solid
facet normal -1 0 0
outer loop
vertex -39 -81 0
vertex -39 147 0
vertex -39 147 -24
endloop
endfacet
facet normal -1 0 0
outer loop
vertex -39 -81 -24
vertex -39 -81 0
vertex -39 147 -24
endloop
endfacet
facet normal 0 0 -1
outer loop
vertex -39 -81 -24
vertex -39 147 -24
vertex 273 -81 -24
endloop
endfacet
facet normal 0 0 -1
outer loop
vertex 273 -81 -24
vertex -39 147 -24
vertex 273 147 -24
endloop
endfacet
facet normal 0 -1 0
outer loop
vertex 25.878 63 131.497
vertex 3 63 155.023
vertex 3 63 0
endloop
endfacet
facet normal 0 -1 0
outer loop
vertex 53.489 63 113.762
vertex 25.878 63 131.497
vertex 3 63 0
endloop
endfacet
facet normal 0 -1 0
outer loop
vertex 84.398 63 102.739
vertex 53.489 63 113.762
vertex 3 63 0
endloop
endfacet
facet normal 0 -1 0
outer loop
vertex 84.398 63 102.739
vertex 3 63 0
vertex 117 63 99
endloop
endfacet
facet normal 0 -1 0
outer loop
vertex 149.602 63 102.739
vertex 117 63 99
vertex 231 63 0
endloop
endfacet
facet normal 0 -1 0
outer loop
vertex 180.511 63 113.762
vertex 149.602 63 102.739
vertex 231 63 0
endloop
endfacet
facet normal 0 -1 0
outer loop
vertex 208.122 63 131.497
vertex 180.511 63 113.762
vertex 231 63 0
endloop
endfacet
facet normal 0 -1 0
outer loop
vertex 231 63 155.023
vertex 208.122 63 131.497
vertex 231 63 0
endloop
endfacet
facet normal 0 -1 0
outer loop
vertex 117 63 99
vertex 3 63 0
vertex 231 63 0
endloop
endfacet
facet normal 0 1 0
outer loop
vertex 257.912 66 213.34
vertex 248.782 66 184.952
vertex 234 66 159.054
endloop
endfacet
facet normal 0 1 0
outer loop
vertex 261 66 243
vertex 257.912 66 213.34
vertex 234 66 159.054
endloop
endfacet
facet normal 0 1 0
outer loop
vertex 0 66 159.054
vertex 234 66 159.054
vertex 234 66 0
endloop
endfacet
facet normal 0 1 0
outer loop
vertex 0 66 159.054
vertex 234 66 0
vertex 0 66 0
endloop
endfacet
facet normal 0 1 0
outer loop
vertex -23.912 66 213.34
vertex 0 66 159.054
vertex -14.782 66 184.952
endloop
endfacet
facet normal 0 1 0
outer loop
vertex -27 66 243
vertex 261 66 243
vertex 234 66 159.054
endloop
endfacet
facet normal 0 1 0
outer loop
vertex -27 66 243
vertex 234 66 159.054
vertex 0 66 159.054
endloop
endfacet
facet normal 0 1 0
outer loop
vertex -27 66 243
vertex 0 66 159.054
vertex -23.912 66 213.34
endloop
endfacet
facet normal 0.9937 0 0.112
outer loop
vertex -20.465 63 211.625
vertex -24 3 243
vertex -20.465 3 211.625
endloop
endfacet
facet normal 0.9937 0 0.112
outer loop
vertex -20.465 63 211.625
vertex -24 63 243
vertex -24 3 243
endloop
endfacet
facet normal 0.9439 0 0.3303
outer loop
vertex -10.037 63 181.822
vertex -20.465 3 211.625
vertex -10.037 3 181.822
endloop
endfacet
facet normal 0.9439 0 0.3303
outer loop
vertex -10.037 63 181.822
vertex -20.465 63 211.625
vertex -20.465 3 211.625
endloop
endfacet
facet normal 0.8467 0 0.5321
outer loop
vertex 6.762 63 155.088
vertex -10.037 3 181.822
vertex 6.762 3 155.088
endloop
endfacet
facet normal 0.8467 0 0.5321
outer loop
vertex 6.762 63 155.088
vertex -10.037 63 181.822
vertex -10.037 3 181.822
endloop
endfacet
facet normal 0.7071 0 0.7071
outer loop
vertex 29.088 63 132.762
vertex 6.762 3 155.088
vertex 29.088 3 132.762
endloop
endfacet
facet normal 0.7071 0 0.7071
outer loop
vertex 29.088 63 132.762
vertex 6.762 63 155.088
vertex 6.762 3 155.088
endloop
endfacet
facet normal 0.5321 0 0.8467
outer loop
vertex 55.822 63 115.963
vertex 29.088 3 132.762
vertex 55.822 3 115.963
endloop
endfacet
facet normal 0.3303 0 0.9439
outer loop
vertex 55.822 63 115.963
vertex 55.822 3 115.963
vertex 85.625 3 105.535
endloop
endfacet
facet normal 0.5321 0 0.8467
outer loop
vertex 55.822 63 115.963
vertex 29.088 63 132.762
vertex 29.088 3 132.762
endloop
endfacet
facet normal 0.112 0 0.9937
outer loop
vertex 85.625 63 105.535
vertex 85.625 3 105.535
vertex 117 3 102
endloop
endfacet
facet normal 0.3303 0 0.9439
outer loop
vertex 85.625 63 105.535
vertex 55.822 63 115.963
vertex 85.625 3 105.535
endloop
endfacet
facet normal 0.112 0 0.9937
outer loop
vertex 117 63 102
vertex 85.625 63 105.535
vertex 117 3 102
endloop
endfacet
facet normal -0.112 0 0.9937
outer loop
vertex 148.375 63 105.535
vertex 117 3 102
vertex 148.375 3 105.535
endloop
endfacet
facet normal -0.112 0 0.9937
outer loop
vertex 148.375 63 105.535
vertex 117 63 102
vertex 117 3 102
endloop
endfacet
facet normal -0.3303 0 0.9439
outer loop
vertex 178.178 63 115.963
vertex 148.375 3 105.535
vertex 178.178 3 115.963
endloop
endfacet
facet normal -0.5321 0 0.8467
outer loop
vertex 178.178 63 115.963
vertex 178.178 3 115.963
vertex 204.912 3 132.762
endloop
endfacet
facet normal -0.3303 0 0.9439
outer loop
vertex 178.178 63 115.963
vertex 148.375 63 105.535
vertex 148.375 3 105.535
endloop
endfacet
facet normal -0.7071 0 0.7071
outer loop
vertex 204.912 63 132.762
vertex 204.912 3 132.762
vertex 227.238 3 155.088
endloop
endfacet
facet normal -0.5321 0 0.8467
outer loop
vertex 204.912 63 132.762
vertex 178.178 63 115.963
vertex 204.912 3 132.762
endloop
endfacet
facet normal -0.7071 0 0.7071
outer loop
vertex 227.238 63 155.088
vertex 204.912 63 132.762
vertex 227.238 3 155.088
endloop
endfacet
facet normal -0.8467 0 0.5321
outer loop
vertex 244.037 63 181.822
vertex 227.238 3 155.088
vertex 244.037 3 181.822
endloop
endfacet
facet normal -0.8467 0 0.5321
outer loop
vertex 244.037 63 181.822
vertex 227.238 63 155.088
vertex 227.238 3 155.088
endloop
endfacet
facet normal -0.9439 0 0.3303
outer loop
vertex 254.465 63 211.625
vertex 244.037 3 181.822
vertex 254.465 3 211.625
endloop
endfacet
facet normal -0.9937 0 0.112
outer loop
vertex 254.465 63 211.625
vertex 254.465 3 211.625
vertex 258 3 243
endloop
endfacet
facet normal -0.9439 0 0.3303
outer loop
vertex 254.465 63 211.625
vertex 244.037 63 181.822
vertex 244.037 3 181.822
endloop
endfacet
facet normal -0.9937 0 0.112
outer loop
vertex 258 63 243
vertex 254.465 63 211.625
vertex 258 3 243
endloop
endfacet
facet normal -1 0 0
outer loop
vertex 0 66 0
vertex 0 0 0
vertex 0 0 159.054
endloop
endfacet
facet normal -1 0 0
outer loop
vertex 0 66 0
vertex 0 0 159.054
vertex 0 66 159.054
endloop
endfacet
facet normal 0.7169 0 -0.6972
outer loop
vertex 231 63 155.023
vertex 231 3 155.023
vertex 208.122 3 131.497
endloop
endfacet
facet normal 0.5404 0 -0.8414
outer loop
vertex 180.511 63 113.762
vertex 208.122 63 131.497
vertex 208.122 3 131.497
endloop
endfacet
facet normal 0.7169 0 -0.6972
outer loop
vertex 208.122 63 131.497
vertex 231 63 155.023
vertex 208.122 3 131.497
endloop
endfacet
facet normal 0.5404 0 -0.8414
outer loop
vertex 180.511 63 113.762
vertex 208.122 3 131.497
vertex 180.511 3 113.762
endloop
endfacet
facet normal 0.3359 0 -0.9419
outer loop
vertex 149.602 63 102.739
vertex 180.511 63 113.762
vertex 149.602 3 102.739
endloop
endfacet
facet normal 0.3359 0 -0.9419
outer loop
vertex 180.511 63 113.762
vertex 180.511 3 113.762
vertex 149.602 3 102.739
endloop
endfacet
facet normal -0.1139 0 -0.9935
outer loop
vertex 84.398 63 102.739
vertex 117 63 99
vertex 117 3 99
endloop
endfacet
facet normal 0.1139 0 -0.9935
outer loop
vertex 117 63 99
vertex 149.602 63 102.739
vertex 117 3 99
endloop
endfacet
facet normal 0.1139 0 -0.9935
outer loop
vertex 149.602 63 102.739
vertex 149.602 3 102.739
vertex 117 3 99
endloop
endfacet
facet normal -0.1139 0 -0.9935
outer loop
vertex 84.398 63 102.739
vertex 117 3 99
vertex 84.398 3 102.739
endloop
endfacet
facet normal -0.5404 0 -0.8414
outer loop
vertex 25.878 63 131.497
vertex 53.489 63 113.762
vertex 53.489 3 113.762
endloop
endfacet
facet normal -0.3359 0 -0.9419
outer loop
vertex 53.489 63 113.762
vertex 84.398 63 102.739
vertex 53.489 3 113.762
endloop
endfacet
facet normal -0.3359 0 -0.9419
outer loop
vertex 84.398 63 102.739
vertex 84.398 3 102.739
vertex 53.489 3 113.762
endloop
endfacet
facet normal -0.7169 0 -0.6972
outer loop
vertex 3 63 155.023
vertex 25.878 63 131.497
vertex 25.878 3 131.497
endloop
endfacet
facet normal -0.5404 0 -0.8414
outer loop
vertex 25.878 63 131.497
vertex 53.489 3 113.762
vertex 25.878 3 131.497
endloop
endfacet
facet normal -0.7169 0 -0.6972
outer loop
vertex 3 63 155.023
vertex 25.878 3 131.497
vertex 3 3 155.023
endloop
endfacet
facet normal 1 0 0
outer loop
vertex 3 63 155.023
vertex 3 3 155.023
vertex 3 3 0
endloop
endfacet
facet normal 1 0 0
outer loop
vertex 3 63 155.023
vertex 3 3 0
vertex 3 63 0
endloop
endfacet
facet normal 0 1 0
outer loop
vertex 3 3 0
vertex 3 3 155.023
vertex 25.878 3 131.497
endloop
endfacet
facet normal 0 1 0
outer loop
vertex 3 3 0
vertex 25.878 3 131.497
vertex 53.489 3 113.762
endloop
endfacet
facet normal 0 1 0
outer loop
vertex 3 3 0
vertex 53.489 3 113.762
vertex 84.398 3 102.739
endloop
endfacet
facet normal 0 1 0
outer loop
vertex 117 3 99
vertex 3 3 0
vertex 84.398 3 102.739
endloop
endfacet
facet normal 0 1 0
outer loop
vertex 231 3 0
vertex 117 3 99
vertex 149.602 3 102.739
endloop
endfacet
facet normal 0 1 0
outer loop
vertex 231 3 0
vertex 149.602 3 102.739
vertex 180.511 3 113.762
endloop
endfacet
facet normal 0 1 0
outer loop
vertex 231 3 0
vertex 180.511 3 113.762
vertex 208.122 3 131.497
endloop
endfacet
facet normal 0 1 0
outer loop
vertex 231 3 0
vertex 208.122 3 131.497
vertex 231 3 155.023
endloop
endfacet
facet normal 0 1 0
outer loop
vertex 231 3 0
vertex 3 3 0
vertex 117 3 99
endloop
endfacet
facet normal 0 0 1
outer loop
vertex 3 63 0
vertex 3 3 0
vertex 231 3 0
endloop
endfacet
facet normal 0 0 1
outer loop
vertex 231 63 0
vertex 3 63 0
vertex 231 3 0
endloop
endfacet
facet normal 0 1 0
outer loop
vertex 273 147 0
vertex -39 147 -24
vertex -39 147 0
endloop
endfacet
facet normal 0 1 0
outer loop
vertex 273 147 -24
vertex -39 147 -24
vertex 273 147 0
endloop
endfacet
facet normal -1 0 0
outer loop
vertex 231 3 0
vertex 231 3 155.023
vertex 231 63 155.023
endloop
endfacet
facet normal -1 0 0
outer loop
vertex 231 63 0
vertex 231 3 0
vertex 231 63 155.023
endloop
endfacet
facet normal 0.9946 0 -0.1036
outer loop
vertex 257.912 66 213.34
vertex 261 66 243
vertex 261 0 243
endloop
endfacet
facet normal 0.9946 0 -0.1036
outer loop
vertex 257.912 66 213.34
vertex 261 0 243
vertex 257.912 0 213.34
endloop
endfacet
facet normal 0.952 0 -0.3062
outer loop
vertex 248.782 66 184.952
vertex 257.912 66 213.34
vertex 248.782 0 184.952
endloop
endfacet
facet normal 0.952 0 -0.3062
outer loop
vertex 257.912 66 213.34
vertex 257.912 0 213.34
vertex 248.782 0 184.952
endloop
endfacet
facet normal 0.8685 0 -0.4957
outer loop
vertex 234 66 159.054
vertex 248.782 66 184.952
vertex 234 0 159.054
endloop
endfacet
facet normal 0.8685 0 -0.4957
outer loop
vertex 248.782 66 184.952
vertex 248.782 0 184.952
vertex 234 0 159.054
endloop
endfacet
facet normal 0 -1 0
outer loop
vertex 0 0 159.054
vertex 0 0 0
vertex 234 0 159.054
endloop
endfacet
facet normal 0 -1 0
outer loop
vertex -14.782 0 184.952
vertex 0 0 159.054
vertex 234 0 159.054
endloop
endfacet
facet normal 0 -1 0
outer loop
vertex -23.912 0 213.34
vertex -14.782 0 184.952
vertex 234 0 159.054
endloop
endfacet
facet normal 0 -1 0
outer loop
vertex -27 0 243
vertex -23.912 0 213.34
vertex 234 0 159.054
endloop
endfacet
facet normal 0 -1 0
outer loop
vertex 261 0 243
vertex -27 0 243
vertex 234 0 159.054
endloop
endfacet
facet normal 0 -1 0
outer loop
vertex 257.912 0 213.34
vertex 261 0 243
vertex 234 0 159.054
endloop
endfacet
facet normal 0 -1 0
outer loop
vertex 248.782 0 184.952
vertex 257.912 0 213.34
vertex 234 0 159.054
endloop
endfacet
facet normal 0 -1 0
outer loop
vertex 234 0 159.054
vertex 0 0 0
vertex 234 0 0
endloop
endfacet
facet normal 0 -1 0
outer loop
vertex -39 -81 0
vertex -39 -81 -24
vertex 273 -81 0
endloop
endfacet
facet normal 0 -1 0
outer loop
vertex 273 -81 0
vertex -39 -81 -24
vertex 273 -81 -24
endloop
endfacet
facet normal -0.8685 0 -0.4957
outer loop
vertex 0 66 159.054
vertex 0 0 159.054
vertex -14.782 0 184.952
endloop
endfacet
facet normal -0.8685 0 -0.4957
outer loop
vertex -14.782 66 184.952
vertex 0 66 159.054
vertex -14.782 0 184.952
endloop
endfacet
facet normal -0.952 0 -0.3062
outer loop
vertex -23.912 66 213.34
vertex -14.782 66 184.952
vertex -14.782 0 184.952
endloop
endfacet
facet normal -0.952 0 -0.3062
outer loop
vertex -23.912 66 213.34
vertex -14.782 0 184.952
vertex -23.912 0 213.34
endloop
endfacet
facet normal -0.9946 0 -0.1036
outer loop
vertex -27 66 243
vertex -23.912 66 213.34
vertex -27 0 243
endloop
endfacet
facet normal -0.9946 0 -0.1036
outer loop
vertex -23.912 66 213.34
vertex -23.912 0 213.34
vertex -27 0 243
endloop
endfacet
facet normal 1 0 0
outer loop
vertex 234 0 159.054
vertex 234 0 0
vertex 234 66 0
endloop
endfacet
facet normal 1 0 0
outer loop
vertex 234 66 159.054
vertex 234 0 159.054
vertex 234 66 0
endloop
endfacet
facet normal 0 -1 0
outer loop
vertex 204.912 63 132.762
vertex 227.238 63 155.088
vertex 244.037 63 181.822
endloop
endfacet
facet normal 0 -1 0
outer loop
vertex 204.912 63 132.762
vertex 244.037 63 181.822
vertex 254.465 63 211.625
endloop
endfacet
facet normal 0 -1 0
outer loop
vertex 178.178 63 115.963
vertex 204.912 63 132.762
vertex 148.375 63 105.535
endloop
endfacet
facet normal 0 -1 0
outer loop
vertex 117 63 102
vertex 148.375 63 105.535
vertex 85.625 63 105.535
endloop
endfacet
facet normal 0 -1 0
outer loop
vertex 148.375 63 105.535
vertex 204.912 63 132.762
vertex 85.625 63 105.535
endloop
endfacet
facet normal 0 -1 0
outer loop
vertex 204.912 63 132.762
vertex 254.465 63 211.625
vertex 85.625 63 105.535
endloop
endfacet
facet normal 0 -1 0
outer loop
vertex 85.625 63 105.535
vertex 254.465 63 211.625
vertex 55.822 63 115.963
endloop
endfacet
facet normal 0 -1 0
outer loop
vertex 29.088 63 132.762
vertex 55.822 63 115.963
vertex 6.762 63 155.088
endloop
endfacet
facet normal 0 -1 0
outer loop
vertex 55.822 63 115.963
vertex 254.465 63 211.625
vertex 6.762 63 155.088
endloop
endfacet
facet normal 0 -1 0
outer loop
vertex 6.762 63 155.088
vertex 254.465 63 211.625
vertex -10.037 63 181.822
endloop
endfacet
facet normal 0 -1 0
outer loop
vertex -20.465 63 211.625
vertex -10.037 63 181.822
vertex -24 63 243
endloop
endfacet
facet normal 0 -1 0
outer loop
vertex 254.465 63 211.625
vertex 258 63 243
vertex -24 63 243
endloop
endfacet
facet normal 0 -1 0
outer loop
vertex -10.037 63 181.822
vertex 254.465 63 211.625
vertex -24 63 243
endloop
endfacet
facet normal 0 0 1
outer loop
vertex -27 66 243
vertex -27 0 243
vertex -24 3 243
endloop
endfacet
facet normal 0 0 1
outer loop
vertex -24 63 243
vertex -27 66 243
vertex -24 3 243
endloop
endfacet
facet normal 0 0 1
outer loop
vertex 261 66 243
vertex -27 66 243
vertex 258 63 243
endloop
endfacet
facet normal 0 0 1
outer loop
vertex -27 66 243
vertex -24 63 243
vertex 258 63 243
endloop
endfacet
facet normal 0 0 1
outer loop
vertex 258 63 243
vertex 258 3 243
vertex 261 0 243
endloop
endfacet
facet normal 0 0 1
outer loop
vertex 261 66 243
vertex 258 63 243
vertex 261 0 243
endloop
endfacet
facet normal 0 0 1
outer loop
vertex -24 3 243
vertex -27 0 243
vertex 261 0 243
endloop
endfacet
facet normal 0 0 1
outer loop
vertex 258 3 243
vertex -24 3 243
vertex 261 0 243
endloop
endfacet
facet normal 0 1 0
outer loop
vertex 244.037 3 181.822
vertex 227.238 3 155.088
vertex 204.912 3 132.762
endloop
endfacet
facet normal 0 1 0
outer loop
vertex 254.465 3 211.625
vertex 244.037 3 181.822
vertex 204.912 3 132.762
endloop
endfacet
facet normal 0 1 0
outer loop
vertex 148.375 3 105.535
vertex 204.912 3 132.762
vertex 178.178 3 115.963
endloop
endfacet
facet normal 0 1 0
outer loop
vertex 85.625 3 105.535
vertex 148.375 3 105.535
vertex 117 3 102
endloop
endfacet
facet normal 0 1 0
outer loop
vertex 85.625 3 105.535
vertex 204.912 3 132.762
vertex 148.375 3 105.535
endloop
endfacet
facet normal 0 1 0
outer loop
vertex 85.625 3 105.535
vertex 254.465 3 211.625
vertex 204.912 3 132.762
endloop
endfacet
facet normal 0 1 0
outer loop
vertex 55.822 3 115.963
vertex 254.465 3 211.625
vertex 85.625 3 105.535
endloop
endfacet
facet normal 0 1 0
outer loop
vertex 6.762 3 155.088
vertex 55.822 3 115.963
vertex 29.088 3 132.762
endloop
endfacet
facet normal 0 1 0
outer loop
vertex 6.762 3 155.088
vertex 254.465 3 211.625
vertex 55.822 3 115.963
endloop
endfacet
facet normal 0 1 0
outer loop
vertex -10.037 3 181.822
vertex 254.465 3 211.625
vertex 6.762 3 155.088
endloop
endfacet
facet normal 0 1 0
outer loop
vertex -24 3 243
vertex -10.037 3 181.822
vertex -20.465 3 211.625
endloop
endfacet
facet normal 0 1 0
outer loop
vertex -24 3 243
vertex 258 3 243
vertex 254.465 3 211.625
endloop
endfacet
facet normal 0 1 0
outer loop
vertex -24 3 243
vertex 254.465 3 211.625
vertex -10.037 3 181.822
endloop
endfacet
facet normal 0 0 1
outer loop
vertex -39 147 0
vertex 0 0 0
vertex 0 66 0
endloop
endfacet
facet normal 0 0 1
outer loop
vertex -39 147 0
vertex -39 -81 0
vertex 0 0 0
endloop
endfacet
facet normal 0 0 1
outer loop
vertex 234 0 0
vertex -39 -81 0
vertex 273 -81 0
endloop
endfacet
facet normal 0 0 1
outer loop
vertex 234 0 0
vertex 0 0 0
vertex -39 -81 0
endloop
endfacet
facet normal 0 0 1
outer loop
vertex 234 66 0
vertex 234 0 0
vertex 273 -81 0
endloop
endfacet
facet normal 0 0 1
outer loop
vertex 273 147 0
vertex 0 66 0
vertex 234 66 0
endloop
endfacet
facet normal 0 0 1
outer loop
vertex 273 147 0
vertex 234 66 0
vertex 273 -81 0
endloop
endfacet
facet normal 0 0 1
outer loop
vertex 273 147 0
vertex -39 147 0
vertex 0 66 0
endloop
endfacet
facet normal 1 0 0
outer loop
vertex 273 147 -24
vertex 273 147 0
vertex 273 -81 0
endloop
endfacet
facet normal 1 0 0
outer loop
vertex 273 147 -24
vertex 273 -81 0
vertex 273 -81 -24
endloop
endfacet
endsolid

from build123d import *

# Parameters (mm, degrees)
SKETCH1_W                = 234
SKETCH1_H                = 66
SKETCH1_W_2              = 228
SKETCH1_H_2              = 60
BOSS_EXTRUDE1_DEPTH      = 243
BOSS_EXTRUDE2_DEPTH      = 66
SKETCH3_W                = 141
SKETCH3_H                = 60
SKETCH4_W                = 312
SKETCH4_H                = 24
BOSS_EXTRUDE3_DEPTH      = 147
BOSS_EXTRUDE3_DEPTH_BACK = 81


with BuildPart() as part:
    # Sketch1 → Boss-Extrude1 (new body)
    with BuildSketch(Plane.XY):
        with Locations((117, 33)):
            Rectangle(SKETCH1_W, SKETCH1_H)
        with Locations((117, 33)):
            Rectangle(SKETCH1_W_2, SKETCH1_H_2, mode=Mode.SUBTRACT)
    extrude(amount=BOSS_EXTRUDE1_DEPTH)

    # Sketch2 → Boss-Extrude2 (add)
    with BuildSketch(Plane.XZ):
        with BuildLine():
            Line((-27, 243), (261, 243))
            ThreePointArc((261, 243), (117, 99), (-27, 243))
        make_face()
    extrude(amount=-BOSS_EXTRUDE2_DEPTH)

    # Sketch3 → Cut-Revolve1 (revolve, cut)
    with BuildSketch(Plane.XY.offset(243)):
        with Locations((187.5, 33)):
            Rectangle(SKETCH3_W, SKETCH3_H)
    revolve(axis=Axis((117, 63, 243), (0, -1, 0)), mode=Mode.SUBTRACT)

    # Sketch4 → Boss-Extrude3 (add, two sides)
    with BuildSketch(Plane(origin=(0, 0, 0), x_dir=(1, 0, 0), z_dir=(0, 1, 0))) as boss_extrude3_sk:
        with Locations((117, 12)):
            Rectangle(SKETCH4_W, SKETCH4_H)
    extrude(amount=BOSS_EXTRUDE3_DEPTH)
    extrude(boss_extrude3_sk.sketch, amount=-BOSS_EXTRUDE3_DEPTH_BACK)


solid = part.part
